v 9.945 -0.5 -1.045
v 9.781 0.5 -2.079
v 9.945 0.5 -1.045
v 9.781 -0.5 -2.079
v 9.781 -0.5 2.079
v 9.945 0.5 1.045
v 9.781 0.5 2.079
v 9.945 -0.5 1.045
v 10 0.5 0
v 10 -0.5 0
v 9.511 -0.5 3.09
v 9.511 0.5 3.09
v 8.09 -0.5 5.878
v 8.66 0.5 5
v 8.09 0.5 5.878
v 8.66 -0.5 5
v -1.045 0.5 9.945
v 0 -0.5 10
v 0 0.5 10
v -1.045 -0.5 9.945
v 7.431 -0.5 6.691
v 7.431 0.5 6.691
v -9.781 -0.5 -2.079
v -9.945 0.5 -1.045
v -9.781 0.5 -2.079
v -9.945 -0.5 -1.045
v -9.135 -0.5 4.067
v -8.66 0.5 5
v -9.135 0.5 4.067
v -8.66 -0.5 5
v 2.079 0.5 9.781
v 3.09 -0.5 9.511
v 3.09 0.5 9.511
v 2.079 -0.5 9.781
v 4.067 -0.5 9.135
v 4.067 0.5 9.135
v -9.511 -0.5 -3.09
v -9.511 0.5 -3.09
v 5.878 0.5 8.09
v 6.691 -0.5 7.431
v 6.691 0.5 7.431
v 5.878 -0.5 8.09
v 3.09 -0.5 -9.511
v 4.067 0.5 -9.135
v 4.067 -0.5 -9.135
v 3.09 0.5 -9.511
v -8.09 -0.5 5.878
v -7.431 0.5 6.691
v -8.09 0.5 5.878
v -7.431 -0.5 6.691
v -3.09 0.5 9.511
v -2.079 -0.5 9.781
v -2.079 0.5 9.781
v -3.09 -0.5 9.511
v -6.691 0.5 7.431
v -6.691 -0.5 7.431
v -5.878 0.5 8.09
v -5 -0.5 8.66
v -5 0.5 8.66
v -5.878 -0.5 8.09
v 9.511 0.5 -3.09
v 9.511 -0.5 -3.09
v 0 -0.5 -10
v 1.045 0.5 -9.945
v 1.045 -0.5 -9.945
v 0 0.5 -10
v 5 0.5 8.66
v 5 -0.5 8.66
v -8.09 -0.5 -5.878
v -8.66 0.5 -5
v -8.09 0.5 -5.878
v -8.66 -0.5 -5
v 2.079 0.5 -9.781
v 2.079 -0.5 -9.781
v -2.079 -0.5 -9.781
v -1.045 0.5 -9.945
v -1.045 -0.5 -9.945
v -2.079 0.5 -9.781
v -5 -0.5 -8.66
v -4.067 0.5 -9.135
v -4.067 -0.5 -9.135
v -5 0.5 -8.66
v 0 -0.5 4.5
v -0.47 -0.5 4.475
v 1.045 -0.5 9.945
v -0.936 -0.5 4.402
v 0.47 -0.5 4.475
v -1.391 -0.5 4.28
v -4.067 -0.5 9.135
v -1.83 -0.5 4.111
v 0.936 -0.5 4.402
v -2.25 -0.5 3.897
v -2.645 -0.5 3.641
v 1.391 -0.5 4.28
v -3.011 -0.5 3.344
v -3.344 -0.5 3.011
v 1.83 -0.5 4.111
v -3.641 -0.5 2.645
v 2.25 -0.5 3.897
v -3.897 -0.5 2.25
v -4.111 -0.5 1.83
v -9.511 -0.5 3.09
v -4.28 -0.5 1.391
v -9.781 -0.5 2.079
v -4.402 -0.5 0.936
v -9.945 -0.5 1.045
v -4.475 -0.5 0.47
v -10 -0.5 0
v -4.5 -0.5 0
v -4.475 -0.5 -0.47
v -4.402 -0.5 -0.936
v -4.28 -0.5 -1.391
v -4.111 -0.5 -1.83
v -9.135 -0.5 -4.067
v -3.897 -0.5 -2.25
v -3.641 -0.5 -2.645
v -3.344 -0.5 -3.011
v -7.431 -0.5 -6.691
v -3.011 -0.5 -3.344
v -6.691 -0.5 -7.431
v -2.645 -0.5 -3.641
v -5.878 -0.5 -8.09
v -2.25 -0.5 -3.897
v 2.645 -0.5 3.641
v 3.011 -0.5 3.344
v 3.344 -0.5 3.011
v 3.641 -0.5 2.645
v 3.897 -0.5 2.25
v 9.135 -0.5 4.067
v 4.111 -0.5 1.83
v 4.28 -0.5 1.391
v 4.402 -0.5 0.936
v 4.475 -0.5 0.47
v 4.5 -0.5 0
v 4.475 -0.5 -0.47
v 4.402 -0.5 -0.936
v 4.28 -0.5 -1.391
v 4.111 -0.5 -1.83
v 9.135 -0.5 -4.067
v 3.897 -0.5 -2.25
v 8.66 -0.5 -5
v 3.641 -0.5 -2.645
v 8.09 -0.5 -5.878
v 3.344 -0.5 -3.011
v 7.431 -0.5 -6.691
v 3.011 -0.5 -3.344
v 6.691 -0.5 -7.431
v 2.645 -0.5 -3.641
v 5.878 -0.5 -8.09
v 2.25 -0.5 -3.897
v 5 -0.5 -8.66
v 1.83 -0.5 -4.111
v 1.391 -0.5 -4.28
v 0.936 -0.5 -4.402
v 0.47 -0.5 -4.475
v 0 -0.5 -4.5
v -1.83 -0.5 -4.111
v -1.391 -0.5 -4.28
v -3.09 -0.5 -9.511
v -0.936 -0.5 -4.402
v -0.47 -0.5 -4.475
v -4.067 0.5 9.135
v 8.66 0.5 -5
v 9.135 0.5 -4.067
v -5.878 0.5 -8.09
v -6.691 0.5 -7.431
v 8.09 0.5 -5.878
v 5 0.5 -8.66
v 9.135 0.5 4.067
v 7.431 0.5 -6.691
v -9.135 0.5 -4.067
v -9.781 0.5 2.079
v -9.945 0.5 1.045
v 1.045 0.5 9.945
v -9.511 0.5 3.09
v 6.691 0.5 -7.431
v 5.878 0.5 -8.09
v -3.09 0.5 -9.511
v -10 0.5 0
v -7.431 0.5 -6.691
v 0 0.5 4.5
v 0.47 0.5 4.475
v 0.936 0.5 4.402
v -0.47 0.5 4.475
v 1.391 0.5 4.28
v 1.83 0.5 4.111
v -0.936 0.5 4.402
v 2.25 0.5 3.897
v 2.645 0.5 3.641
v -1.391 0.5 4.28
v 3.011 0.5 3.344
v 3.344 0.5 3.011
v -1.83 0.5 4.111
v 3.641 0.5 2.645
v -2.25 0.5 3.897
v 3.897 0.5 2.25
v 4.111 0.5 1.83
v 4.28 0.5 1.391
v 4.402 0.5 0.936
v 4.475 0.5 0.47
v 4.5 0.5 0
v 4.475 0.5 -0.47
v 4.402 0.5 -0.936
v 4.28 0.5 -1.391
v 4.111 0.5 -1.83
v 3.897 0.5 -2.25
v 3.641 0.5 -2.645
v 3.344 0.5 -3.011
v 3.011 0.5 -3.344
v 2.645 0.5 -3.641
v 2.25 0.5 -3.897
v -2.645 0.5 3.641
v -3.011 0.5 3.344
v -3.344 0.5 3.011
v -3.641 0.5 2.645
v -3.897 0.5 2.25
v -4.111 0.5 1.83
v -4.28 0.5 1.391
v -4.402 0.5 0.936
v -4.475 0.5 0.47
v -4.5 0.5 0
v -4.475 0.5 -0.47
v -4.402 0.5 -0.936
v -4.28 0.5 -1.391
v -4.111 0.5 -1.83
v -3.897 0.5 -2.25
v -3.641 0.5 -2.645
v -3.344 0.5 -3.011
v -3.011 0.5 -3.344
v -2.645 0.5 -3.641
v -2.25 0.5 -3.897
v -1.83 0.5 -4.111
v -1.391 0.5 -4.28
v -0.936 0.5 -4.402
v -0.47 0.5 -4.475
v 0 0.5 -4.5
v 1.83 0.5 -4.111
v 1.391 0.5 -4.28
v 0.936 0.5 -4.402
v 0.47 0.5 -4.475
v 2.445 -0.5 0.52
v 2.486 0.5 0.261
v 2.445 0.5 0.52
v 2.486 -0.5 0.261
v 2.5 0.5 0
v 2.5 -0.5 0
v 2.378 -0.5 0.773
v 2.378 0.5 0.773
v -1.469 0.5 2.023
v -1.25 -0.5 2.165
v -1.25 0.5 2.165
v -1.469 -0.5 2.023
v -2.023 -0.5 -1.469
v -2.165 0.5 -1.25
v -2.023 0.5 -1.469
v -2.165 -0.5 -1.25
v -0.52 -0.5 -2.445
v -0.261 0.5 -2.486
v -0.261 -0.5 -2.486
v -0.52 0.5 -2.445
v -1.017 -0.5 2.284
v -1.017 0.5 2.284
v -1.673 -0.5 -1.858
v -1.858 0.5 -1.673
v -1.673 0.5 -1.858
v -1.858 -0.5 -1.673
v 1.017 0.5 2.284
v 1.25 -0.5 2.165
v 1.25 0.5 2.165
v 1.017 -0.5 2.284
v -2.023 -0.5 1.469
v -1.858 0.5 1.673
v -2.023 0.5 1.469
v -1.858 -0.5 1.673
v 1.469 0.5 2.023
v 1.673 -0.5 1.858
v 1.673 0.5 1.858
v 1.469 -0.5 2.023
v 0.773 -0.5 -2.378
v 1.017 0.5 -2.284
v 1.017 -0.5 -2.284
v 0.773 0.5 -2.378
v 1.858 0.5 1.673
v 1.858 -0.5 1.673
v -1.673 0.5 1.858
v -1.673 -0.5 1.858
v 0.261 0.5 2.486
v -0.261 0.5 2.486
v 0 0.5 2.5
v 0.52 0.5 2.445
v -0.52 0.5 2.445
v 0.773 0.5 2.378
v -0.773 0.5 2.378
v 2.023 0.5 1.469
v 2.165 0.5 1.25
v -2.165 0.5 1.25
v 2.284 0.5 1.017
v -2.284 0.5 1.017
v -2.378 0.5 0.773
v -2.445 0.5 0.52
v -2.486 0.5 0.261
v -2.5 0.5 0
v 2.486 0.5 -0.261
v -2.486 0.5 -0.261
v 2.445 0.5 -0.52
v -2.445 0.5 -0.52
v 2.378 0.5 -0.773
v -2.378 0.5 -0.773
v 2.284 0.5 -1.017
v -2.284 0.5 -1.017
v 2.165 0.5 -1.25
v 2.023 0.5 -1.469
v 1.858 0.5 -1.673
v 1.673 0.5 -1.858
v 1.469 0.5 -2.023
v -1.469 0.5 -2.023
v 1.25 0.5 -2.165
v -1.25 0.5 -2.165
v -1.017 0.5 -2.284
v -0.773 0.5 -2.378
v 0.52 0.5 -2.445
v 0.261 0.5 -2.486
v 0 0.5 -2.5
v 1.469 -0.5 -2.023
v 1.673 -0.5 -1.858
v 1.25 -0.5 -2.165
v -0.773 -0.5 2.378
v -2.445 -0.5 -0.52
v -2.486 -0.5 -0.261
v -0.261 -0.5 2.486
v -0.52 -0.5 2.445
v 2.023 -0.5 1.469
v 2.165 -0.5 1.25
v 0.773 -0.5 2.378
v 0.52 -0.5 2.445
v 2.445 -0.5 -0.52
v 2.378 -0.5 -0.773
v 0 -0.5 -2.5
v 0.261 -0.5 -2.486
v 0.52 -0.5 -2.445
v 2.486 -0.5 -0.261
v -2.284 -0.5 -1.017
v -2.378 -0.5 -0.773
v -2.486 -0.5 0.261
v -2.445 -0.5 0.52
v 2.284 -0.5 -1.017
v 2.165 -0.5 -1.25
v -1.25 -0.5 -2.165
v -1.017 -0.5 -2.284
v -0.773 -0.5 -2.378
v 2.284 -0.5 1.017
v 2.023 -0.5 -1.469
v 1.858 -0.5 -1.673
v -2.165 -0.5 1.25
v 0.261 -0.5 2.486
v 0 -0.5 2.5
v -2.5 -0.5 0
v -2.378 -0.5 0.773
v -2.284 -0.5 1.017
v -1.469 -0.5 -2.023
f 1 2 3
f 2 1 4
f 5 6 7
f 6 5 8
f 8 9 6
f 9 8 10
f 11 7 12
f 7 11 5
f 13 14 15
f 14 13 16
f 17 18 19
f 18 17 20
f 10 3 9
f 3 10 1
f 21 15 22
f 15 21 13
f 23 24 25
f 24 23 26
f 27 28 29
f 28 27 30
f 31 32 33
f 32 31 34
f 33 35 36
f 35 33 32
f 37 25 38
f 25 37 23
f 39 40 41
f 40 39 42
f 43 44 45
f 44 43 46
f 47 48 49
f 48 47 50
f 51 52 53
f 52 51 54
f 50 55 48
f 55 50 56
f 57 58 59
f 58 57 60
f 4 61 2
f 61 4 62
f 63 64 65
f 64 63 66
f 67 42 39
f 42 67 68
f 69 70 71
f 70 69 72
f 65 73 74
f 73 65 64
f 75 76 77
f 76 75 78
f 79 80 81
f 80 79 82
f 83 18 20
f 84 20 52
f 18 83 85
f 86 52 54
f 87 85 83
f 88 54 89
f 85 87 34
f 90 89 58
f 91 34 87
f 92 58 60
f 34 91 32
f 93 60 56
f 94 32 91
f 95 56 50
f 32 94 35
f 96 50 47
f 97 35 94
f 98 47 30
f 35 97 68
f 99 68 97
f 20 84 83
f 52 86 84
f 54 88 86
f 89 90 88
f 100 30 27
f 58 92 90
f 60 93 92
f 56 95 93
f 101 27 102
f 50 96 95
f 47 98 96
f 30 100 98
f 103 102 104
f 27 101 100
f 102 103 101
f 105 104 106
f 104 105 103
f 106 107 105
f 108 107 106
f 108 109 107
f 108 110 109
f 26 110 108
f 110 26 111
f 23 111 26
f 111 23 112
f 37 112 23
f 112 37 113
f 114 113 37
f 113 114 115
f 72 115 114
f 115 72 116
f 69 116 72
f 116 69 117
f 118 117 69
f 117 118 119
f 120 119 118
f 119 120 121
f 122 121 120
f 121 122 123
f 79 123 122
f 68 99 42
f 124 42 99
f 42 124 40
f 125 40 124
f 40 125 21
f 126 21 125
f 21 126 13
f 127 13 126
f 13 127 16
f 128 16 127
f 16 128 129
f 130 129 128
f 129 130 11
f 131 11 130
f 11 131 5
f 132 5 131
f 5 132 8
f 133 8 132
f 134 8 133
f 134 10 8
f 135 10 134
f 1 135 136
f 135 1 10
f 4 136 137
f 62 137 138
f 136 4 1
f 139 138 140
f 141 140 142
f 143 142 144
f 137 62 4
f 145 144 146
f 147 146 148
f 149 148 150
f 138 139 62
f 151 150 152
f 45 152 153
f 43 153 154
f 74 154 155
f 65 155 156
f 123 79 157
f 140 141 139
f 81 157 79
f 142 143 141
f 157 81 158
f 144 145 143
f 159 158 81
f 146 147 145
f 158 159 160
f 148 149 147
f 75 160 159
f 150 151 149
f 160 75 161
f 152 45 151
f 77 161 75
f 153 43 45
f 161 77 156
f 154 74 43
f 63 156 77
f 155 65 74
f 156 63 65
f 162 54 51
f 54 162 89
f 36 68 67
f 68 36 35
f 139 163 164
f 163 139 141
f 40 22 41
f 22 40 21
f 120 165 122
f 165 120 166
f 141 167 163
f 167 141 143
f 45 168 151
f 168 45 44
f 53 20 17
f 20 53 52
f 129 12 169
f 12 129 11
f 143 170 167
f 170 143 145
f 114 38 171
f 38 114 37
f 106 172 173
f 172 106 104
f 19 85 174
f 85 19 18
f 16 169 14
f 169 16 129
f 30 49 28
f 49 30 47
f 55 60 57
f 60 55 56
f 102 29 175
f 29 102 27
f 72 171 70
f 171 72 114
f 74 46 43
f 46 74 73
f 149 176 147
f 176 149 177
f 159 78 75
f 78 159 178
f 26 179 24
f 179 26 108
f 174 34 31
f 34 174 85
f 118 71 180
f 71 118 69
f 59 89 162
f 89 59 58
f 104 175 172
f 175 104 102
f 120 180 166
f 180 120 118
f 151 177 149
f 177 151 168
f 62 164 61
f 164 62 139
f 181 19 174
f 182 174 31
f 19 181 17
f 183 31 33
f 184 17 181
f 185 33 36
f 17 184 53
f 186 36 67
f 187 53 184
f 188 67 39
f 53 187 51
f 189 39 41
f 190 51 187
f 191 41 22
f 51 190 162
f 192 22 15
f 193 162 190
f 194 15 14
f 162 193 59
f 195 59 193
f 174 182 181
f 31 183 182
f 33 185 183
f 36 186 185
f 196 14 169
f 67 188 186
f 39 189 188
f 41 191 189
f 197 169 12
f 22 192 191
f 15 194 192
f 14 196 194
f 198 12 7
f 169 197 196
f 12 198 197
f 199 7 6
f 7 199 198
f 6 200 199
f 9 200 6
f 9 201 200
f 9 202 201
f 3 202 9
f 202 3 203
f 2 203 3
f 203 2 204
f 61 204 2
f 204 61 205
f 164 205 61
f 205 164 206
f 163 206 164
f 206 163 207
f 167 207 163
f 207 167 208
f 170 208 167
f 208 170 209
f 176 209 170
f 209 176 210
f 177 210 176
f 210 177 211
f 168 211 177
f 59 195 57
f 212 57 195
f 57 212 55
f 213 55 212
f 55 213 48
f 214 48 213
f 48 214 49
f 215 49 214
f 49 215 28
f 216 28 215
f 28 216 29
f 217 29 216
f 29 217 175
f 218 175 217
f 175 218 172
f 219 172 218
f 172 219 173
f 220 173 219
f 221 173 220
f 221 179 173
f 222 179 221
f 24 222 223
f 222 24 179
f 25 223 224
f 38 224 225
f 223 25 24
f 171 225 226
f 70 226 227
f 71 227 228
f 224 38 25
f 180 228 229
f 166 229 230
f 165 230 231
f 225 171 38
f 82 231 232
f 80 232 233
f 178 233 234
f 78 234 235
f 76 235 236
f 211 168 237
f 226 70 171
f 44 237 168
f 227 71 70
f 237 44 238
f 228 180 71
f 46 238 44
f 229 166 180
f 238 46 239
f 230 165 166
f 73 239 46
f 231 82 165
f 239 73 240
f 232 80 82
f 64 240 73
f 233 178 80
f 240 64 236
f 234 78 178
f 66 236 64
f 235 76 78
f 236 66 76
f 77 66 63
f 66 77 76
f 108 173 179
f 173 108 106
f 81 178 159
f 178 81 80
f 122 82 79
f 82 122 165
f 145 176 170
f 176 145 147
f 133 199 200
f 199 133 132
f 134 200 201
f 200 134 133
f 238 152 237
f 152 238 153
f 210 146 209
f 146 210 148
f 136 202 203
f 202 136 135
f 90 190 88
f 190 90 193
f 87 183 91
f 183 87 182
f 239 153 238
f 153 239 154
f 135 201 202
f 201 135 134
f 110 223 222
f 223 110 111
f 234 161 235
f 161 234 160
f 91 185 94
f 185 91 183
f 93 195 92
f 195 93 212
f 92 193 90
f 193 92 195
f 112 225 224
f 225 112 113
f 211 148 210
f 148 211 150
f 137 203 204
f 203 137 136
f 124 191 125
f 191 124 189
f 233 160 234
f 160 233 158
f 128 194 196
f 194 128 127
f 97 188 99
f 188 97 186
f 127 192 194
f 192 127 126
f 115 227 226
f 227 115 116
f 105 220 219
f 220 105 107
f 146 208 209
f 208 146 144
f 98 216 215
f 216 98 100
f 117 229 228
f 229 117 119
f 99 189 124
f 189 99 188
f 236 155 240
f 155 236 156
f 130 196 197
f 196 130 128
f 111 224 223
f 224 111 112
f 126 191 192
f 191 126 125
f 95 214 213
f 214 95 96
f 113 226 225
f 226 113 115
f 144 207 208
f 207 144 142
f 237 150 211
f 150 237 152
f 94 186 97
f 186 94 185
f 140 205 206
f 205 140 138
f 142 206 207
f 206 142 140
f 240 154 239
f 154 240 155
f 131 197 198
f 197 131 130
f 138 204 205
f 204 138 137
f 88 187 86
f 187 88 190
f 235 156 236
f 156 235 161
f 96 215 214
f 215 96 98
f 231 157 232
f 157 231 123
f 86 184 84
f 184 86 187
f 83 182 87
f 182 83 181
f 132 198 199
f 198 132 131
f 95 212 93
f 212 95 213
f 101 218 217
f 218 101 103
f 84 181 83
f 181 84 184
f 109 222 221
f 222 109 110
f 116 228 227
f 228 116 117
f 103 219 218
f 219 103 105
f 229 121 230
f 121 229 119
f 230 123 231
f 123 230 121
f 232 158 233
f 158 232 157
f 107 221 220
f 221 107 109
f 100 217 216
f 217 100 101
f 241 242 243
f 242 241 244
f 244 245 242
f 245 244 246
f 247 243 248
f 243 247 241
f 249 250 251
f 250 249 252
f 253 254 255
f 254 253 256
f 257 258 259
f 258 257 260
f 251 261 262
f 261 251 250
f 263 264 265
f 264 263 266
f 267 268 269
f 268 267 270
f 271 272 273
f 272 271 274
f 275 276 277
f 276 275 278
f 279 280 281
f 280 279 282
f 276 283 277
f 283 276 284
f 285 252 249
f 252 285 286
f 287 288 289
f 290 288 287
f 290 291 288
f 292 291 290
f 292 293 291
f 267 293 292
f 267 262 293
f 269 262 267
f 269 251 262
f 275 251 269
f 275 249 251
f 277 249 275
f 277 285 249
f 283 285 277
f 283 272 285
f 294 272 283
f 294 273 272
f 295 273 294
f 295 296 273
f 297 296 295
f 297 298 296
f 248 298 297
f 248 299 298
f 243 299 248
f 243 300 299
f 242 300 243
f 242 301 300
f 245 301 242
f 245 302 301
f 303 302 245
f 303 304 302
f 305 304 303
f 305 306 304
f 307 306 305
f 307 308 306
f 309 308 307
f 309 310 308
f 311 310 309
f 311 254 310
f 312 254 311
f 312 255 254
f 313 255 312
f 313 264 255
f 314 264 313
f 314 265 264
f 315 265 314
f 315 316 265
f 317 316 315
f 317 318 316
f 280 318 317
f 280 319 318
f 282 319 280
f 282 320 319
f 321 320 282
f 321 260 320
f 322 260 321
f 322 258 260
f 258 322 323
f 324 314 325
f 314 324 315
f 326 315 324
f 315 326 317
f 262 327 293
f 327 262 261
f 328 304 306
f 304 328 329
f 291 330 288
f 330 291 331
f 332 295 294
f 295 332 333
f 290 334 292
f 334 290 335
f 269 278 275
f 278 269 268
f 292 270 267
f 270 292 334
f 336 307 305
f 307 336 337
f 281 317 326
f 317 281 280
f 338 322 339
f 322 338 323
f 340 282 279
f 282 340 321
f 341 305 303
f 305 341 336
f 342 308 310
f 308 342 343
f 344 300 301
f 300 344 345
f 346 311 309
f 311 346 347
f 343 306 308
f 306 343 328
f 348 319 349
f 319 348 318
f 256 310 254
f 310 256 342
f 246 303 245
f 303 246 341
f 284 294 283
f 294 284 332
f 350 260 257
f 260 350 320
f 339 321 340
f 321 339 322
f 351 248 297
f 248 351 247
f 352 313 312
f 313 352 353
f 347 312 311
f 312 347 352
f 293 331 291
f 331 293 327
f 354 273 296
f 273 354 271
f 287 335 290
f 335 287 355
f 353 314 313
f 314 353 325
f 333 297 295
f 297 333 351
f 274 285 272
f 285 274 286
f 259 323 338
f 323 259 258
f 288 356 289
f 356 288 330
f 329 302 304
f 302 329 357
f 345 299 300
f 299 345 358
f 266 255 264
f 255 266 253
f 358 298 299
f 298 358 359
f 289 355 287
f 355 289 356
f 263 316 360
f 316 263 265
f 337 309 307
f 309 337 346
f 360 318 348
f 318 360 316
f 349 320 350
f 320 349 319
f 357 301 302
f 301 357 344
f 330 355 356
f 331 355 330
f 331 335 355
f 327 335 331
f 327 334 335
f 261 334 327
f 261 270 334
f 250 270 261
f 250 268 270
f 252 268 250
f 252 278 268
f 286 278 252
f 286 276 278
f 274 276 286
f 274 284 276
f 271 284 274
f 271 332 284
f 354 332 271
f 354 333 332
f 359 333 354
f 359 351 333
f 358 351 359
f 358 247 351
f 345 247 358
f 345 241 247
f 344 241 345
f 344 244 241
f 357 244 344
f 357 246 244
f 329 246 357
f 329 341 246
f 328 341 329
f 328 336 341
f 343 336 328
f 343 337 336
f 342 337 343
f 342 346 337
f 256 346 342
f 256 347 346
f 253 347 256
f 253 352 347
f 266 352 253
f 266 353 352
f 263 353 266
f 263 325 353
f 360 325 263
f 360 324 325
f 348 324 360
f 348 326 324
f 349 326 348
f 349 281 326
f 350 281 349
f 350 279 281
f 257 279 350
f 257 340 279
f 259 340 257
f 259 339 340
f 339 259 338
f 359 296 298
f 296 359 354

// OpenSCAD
module ColorToolIcon() {
  difference() {
    cylinder(r = 10,  h = 1, center = true);
    cylinder(r = 4.5, h = 2, center = true);
  }
  cylinder(r = 2.5, h = 1, center = true);
}

// Rotate so that Y is up.
rotate([90, 0, 0]) ColorToolIcon($fn = 60);
